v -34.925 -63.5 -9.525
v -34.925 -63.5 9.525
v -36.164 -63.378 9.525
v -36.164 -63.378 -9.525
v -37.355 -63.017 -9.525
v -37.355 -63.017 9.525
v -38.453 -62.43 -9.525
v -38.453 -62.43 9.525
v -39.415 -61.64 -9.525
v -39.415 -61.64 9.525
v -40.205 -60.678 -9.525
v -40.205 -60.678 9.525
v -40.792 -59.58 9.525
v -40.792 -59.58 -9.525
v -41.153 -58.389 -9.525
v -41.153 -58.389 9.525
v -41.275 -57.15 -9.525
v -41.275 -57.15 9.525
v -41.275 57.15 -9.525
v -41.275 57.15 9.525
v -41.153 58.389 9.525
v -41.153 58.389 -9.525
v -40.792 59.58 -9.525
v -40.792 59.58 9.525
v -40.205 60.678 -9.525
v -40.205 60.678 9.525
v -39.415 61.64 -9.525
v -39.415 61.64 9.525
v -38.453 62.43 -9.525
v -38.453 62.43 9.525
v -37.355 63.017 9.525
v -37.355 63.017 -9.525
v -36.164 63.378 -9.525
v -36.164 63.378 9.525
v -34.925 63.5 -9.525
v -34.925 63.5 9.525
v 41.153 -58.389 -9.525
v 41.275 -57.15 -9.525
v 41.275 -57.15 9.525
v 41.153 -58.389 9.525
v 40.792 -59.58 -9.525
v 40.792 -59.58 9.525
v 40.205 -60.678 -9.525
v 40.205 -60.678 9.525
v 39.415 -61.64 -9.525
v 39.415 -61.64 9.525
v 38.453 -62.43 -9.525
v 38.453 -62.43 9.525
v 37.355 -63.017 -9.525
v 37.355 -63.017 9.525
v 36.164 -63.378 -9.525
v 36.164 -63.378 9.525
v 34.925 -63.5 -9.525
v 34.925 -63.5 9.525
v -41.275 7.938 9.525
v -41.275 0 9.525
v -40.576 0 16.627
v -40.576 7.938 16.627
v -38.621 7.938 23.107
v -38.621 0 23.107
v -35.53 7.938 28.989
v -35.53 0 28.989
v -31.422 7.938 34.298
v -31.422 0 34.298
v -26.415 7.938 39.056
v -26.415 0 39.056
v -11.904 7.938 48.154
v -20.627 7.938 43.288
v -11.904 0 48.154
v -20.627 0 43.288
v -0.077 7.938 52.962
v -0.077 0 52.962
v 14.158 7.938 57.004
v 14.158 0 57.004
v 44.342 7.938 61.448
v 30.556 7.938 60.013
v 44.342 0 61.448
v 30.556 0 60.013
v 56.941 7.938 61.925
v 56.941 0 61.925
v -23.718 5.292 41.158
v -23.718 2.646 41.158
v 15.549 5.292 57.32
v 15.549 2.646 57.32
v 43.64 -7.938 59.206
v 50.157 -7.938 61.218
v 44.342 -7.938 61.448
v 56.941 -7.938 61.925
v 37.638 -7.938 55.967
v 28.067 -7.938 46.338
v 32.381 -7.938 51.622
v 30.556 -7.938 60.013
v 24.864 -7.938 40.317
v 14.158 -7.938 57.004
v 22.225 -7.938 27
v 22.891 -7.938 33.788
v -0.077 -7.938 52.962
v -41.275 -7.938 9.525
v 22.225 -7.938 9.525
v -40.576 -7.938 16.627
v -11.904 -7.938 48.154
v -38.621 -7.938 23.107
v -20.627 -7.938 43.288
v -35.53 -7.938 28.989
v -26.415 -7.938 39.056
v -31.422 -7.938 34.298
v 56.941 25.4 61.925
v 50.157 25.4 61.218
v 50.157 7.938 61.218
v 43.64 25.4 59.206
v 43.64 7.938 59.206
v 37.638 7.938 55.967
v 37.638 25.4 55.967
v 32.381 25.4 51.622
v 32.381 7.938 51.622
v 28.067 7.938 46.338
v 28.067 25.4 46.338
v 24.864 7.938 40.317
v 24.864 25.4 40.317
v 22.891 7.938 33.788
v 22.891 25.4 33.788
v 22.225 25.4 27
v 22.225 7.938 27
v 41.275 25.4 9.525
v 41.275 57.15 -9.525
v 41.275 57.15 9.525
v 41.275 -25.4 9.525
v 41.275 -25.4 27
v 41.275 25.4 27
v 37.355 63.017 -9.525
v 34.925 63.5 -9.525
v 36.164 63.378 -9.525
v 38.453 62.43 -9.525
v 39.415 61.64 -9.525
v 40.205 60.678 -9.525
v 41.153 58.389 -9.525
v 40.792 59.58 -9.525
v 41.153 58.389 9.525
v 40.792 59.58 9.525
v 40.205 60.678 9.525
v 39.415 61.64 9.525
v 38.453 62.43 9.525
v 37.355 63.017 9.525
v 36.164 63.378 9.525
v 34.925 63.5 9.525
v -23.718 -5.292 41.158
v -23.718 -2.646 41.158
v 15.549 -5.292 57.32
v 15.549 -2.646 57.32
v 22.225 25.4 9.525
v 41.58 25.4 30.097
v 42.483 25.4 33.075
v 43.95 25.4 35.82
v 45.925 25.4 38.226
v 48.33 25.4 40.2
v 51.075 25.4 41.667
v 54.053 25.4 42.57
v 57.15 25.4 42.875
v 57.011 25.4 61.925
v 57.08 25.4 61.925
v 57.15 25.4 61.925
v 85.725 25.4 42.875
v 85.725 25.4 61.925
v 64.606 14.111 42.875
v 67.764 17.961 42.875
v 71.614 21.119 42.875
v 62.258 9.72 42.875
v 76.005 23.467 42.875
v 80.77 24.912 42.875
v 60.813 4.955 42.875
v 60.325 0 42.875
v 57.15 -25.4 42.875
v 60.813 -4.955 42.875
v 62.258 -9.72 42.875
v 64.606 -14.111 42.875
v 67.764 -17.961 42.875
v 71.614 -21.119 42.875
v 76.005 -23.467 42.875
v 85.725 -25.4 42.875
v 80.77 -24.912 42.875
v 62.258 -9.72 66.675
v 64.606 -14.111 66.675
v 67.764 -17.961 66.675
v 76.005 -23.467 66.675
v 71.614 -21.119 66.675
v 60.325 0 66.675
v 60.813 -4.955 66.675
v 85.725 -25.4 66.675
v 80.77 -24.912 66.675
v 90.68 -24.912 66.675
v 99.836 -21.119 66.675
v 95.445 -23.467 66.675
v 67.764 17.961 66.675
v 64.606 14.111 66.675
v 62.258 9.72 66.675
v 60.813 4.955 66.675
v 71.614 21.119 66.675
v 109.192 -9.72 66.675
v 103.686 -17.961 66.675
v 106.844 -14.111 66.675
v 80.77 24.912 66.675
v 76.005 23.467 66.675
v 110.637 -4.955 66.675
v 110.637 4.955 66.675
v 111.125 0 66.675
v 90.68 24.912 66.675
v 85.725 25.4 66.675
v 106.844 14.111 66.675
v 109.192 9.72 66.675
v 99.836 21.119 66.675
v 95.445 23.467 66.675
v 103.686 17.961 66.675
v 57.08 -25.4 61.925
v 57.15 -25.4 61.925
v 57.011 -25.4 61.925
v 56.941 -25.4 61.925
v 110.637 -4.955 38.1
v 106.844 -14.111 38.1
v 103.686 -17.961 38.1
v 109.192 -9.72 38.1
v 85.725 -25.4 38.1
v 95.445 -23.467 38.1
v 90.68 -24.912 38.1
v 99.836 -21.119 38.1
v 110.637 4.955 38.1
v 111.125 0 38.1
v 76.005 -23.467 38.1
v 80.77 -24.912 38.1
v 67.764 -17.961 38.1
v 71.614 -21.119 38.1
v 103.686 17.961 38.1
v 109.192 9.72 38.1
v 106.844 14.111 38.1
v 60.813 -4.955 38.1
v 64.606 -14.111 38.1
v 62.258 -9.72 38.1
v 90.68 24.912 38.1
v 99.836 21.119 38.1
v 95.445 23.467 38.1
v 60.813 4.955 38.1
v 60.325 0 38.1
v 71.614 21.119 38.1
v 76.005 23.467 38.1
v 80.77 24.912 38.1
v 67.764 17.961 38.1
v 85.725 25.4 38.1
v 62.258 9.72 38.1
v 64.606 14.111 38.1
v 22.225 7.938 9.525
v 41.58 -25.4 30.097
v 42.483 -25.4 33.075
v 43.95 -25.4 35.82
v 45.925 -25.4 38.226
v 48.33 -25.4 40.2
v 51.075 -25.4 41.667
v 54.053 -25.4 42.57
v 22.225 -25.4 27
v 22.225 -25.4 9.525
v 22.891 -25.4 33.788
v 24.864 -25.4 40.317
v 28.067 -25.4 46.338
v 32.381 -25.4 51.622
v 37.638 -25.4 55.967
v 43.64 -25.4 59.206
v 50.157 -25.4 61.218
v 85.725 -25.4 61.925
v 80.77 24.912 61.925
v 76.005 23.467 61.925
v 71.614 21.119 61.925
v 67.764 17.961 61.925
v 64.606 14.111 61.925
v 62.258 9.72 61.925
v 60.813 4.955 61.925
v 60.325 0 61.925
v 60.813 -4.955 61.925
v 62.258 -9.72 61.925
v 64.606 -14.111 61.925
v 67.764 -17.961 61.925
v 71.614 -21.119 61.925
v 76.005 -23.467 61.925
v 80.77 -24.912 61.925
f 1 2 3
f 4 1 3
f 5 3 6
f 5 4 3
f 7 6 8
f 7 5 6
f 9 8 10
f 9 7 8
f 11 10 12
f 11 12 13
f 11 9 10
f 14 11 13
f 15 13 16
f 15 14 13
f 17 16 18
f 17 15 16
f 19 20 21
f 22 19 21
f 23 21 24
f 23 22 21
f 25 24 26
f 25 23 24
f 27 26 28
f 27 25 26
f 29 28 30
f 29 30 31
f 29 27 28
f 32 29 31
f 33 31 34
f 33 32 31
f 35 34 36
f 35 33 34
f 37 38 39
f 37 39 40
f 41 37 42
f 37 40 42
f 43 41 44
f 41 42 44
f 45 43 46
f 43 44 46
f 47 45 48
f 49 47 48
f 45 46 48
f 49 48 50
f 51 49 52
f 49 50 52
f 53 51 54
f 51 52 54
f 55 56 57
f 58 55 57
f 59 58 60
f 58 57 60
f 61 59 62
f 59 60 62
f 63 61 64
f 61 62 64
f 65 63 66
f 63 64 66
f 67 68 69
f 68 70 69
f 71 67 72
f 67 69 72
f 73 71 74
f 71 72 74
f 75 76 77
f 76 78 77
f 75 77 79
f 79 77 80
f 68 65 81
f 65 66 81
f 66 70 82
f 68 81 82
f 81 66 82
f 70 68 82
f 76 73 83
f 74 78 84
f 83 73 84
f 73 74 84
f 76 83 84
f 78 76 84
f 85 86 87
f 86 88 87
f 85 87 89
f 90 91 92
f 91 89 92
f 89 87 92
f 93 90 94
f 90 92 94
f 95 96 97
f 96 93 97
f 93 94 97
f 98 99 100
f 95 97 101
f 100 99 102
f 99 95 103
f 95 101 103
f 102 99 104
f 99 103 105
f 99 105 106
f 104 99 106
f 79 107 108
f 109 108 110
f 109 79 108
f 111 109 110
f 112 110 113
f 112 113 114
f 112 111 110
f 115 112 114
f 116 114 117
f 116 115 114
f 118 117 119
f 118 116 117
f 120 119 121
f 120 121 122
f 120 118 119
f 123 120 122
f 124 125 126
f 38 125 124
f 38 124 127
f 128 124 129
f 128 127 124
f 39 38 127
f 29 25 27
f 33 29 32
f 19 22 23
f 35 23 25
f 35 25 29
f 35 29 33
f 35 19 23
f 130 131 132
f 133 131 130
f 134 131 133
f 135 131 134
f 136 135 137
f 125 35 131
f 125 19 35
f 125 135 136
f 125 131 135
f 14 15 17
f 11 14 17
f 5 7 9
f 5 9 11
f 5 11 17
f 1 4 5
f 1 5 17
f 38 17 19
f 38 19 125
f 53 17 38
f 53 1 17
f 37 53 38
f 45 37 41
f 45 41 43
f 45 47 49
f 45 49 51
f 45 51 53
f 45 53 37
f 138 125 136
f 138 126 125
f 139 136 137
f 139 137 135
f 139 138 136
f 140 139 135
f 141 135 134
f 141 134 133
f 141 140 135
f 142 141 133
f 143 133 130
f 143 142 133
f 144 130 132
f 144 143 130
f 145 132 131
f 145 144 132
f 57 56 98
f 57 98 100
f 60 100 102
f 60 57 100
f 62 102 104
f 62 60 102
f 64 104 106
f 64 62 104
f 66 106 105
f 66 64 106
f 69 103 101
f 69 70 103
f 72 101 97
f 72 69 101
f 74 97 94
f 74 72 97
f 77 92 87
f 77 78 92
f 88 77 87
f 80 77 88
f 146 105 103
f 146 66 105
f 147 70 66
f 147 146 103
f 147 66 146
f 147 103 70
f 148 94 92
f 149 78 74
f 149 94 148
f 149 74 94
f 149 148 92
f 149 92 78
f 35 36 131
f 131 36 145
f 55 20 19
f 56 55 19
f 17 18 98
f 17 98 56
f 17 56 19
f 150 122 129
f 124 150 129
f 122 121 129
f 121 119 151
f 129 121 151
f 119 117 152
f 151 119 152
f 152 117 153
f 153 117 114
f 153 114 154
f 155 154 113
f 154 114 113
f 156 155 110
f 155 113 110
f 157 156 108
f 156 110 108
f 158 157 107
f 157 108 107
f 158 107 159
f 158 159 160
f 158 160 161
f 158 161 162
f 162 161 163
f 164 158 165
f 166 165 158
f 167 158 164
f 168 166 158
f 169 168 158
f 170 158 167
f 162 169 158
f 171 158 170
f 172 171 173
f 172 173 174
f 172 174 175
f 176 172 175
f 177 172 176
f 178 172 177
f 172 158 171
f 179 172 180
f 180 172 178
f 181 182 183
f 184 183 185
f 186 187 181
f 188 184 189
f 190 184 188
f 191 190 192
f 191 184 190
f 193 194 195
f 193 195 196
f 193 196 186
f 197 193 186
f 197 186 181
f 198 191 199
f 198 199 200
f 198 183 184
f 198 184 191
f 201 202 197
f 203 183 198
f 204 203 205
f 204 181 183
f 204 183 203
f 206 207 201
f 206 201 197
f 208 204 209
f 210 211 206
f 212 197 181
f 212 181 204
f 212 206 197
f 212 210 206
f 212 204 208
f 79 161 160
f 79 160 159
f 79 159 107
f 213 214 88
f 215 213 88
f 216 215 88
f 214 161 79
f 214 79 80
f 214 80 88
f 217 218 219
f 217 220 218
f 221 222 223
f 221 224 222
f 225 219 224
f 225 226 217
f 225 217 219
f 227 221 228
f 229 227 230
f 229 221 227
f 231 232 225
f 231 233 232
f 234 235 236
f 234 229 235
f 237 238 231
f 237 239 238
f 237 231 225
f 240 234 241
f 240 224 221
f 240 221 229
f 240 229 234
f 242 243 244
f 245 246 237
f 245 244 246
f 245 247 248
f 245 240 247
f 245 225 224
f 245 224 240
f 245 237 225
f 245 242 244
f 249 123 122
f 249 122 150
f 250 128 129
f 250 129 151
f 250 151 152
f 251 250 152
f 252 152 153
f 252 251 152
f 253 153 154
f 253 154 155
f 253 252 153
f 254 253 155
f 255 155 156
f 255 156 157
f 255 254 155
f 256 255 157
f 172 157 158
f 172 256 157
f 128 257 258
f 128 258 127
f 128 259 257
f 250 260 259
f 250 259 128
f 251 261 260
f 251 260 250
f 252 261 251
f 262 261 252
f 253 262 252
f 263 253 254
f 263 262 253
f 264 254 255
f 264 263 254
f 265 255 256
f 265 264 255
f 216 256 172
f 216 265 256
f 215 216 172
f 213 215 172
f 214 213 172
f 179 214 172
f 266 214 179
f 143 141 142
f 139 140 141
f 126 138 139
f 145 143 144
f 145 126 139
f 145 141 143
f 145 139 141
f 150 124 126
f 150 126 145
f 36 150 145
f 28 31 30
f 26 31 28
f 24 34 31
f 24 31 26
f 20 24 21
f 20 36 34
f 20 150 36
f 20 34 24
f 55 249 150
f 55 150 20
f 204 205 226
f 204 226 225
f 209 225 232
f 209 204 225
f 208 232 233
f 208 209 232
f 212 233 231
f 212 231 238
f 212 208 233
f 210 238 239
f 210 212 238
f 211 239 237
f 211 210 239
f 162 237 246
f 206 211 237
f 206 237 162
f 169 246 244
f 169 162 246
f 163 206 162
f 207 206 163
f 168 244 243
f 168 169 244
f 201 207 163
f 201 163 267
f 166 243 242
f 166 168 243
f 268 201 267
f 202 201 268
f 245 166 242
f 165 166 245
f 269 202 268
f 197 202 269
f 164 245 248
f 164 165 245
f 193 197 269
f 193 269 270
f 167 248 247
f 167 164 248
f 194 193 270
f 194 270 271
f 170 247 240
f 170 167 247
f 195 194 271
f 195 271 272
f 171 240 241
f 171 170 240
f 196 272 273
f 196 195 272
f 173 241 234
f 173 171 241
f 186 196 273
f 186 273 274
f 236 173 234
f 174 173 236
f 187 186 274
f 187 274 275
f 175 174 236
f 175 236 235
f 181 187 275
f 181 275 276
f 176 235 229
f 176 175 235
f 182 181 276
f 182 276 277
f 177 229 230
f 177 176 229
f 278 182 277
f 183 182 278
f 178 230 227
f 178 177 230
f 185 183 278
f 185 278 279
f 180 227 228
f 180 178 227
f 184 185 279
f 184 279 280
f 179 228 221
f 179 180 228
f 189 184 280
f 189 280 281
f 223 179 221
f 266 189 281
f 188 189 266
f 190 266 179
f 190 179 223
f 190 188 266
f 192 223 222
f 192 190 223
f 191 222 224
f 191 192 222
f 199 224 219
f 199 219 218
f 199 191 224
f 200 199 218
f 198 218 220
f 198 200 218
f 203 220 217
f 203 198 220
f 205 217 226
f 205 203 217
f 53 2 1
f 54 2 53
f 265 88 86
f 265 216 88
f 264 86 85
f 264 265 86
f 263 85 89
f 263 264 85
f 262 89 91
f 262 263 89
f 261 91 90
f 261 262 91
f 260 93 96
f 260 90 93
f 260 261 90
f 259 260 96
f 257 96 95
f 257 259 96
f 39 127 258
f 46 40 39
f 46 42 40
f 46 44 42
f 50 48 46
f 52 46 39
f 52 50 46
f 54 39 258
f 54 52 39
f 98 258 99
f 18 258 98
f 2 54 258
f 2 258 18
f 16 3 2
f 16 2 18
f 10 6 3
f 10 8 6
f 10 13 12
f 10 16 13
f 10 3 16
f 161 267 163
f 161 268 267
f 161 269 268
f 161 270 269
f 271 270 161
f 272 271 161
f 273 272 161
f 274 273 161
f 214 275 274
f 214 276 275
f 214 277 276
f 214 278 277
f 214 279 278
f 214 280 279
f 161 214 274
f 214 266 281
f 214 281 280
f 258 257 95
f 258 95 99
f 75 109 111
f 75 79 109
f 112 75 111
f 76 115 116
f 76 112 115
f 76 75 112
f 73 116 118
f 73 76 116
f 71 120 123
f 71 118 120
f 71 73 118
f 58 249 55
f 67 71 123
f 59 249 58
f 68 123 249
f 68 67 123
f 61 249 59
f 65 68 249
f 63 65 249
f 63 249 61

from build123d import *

# Parameters (mm, degrees)
F1_DEPTH = 63.5
F0_W     = 25.4
F0_H     = 19.05
F2_DEPTH = 25.4
F3_DEPTH = 7.9375
F5_R     = 6.35


with BuildPart() as f1:
    # F0 (on Front) → F1 (new body, symmetric)
    with BuildSketch(Plane.XZ):
        Polygon((22.225, 9.525), (-41.275, 9.525), (-41.275, -9.525), (41.275, -9.525), (41.275, 9.525), align=None)
    extrude(amount=F1_DEPTH, both=True)

    # F0 (on Front) → F2 (join, symmetric)
    with BuildSketch(Plane.XZ):
        with BuildLine():
            Line((22.225, 27.0002), (22.225, 9.525))
            Line((22.225, 9.525), (41.275, 9.525))
            Line((41.275, 9.525), (41.275, 27.0002))
            ThreePointArc((41.275, 27.0002), (45.9246798487, 38.2255201513), (57.15, 42.8752))
            Line((57.15, 42.8752), (60.325, 42.8752))
            Line((60.325, 42.8752), (60.325, 61.9252))
            Line((60.325, 61.9252), (57.15, 61.9252))
            ThreePointArc((57.15, 61.9252), (57.0455916297, 61.9250439351), (56.9411841925, 61.9245757419))
            ThreePointArc((56.9411841925, 61.9245757419), (32.3805781549, 51.6219661117), (22.225, 27.0002))
        make_face()
        with Locations((73.025, 52.4002)):
            Rectangle(F0_W, F0_H)
    extrude(amount=F2_DEPTH, both=True)

    # F0 (on Front) → F3 (join, symmetric)
    with BuildSketch(Plane.XZ):
        with BuildLine():
            add(Edge.make_bspline(
                [(-41.275, 9.525), (-41.1011968465, 50.1983393078), (21.0140626071, 61.7950971069), (56.9411841925, 61.9245757419)],
                knots=[0, 0, 0, 0, 111.2886193757, 111.2886193757, 111.2886193757, 111.2886193757], degree=3))
            Line((-41.275, 9.525), (22.225, 9.525))
            Line((22.225, 9.525), (22.225, 27.0002))
            ThreePointArc((22.225, 27.0002), (32.3805781549, 51.6219661117), (56.9411841925, 61.9245757419))
        make_face()
    extrude(amount=F3_DEPTH, both=True)

    # F0 (on Front) → F4 (revolve)
    with BuildSketch(Plane.XZ):
        Polygon((85.725, 66.675), (85.725, 61.9252), (85.725, 42.8752), (85.725, 38.1), (111.125, 38.1), (111.125, 66.675), align=None)
    revolve(axis=Axis((85.725, 0, 54.7751), (0, 0, 1)))

    # F5
    f5_edges = [f1.edges().sort_by_distance(p)[0] for p in [
        (41.275, -63.5, 0),
        (-41.275, -63.5, 0),
        (-41.275, 63.5, 0),
        (41.275, 63.5, 0),
    ]]
    fillet(f5_edges, radius=F5_R)


solid = f1.part
